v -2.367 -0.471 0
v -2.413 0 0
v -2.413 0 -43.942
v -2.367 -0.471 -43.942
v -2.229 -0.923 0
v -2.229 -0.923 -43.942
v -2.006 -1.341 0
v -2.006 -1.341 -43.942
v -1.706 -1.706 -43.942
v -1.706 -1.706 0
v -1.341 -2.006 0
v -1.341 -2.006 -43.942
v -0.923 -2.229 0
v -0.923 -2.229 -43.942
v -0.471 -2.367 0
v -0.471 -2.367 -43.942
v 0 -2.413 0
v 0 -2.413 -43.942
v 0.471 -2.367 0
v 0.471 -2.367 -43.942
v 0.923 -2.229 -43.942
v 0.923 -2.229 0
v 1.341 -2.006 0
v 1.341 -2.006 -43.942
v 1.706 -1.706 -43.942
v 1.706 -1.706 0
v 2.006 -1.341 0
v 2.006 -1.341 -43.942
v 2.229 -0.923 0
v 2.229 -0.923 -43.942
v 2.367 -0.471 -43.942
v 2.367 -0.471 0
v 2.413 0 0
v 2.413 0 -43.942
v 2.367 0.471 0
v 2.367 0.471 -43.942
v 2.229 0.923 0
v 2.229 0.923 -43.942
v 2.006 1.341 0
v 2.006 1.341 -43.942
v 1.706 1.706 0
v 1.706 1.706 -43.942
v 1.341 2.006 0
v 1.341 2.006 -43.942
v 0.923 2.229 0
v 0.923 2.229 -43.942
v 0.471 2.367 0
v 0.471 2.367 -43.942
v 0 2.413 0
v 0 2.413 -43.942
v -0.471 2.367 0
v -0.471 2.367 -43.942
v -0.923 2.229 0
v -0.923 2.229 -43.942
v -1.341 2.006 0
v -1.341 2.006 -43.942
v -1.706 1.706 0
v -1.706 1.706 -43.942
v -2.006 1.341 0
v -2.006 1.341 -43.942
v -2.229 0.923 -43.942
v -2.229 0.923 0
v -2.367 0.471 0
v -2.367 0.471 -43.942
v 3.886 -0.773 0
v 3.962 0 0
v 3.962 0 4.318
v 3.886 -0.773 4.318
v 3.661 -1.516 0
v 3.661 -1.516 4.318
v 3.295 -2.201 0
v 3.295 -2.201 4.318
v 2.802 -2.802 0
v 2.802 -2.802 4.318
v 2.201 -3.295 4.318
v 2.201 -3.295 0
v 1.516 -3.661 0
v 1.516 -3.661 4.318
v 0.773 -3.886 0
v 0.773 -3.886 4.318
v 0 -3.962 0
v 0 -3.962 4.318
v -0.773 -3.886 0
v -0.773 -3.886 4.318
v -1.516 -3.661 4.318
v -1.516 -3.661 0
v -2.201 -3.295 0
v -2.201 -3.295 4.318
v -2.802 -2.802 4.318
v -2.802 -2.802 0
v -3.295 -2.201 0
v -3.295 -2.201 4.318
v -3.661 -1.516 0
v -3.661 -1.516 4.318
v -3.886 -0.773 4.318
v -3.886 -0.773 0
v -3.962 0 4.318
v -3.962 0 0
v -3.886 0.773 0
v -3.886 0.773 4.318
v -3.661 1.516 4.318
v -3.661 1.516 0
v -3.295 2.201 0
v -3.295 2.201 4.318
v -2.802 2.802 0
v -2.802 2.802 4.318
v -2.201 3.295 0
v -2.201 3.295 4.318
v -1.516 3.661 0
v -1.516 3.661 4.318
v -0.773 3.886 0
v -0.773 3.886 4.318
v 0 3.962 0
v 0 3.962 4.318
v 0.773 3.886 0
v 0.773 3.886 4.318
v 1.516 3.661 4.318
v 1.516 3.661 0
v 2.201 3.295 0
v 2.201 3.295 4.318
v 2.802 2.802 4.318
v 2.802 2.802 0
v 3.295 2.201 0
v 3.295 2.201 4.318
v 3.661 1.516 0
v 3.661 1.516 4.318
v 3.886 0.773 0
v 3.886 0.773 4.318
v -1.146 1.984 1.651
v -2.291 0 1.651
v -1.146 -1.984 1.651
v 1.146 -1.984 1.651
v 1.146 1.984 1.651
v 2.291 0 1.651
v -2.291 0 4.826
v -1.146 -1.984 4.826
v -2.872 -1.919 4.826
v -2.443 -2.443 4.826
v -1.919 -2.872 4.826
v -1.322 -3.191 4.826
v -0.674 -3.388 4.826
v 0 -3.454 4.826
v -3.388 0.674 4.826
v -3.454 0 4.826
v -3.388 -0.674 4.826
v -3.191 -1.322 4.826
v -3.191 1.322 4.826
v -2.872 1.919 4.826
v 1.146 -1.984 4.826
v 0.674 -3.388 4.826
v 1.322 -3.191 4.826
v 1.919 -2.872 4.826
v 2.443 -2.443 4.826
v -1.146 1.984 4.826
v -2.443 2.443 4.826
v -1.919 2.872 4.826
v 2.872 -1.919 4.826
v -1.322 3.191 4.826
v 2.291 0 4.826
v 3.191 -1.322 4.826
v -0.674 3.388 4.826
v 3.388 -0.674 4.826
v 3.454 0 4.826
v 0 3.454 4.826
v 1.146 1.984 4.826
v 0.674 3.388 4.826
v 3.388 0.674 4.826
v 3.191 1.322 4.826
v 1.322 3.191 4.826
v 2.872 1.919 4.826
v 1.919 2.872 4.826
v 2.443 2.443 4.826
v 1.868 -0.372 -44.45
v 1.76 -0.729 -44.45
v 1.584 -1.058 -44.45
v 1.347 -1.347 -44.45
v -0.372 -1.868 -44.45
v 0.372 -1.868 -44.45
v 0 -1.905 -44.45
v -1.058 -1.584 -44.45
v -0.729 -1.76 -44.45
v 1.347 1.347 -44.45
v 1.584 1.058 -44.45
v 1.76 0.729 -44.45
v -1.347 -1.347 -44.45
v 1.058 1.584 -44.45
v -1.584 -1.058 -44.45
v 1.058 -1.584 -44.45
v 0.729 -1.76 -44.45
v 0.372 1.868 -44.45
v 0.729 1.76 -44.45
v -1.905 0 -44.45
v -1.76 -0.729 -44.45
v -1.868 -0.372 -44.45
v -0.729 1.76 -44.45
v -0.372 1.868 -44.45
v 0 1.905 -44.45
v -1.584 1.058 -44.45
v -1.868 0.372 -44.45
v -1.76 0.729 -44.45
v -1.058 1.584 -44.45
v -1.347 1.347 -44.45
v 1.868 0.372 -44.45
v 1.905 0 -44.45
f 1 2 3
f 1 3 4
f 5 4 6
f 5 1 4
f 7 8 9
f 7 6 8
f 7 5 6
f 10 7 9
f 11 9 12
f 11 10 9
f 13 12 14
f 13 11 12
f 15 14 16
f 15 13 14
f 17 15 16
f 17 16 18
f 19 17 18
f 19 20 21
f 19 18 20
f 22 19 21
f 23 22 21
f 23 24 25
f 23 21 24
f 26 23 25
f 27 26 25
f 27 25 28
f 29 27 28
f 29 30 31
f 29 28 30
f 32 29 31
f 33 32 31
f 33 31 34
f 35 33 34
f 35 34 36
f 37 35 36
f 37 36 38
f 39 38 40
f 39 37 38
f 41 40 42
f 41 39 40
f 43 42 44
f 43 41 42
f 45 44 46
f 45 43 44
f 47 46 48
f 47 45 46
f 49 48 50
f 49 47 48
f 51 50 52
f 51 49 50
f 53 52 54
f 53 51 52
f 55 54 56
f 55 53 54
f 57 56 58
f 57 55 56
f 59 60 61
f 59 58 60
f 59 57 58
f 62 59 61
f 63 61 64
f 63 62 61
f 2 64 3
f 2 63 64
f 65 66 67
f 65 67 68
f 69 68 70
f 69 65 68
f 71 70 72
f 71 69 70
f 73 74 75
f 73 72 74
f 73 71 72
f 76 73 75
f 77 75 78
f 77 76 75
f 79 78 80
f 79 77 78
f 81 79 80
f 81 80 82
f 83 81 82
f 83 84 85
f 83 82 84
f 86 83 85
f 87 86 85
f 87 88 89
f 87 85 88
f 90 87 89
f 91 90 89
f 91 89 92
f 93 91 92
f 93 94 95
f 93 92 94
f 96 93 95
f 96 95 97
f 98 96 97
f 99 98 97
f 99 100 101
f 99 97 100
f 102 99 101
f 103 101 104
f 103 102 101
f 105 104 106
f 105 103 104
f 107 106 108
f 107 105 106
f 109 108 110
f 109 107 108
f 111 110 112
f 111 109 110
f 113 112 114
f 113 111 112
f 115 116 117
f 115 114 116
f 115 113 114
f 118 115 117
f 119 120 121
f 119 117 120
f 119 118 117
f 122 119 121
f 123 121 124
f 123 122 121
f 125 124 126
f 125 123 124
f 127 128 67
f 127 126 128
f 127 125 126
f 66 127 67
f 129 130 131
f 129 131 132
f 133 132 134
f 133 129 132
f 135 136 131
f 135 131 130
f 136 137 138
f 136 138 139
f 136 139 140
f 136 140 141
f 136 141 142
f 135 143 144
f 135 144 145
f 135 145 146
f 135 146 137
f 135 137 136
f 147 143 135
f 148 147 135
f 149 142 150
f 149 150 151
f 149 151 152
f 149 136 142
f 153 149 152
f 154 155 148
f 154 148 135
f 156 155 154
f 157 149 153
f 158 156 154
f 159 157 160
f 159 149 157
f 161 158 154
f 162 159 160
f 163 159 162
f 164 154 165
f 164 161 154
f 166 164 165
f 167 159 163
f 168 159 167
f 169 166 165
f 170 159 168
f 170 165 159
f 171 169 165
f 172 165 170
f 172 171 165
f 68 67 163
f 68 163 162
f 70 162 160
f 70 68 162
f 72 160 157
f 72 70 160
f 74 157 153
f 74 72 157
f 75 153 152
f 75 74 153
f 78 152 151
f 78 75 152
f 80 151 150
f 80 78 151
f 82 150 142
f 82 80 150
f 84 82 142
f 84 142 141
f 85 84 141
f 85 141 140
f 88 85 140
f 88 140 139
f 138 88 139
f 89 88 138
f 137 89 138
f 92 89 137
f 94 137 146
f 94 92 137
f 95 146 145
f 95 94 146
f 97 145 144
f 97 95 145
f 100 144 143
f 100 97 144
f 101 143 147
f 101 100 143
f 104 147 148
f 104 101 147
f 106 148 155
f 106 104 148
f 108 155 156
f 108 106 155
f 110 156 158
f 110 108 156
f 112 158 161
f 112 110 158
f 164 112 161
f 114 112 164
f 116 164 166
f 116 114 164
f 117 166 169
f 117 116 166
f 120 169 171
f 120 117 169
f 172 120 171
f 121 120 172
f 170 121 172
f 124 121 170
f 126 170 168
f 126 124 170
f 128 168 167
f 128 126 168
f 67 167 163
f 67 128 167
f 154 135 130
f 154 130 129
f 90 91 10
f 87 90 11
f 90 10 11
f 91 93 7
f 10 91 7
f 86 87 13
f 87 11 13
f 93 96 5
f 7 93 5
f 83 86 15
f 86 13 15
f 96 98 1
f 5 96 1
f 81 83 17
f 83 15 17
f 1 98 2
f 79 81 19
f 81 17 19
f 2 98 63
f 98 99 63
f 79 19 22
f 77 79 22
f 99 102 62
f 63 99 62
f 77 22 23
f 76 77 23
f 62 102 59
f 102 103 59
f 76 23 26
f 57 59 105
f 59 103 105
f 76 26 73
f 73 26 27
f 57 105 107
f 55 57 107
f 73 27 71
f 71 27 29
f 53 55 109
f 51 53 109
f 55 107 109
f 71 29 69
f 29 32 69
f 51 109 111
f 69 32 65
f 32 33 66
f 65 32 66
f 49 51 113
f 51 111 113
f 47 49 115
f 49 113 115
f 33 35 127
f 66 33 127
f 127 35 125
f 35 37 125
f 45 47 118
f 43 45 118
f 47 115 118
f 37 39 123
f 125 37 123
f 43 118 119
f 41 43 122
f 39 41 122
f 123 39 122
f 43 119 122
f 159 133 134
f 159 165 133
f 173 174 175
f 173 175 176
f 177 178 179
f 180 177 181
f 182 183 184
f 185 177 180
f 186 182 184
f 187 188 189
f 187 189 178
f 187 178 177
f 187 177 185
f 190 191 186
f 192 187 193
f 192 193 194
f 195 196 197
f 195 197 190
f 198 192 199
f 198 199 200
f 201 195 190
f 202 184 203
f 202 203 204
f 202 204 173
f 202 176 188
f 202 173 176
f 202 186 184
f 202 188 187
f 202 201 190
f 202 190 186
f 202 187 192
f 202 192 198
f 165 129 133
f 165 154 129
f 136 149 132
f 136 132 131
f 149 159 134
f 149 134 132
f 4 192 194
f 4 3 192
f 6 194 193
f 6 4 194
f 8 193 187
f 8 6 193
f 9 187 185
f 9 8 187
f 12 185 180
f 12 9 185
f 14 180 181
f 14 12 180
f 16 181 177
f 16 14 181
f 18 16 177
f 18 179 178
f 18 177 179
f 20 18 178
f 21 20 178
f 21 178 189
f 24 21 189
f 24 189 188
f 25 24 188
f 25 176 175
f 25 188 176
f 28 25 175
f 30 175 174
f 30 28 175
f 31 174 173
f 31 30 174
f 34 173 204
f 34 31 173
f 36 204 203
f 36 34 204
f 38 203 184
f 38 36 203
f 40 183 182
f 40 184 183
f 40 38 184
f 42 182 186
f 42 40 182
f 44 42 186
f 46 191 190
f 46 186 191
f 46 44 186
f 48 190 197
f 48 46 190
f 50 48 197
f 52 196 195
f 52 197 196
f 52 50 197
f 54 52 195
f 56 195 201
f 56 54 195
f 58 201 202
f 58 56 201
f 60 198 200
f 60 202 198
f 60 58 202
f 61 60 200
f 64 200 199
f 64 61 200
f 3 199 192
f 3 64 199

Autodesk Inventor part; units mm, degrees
ref_plane "YZ Plane" through (0, 0, 0) normal (1, 0, 0) x (0, 1, 0)
ref_plane "XZ Plane" through (0, 0, 0) normal (0, 1, 0) x (-1, 0, 0)
ref_plane "XY Plane" through (0, 0, 0) normal (0, 0, 1) x (1, 0, 0)
sketch "Sketch1" plane through (0, 0, 0) normal (0, 0, 1) x (1, 0, 0)
  circle A0 centre (0, 0) radius 3.9624
  dimension "d0" = 7.9248
extrude "Extrusion1" add sketch "Sketch1" along normal blind 4.826
sketch "Sketch2" plane through (0, 0, 0) normal (0, 0, -1) x (-1, 0, 0)
  circle A0 centre (0, 0) radius 3.9624 projected
  circle A1 centre (0, 0) radius 2.413
  dimension "d3" = 4.826
extrude "Extrusion2" add sketch "Sketch2" along normal blind 44.45 contours A1
sketch "Sketch3" plane through (0, 0, 4.826) normal (0, 0, 1) x (1, 0, 0)
  circle A0 centre (0, 0) radius 3.9624 projected
  line L0 (-1.1457, 1.9844) -> (1.1457, 1.9844)
  line L1 (1.1457, 1.9844) -> (2.2914, 0)
  line L2 (2.2914, 0) -> (1.1457, -1.9844)
  line L3 (1.1457, -1.9844) -> (-1.1457, -1.9844)
  line L4 (-1.1457, -1.9844) -> (-2.2914, 0)
  line L5 (-2.2914, 0) -> (-1.1457, 1.9844)
  dimension "d6" = 3.9688
extrude "Extrusion3" cut sketch "Sketch3" against normal blind 3.175 contours L0 L1 L2 L3 L4 L5
thread "Thread1" size "10-32 UNF" class "2A" standard "ANSI Unified Screw Threads" length 25.4
chamfer "Chamfer1" distance 0.508 angle 45 1 edges at (2.413, 0, -44.45)
chamfer "Chamfer2" distance 0.508 angle 45 1 edges at (-3.9624, 0, 4.826)
properties part number "10-32 x1000" material "Steel"
